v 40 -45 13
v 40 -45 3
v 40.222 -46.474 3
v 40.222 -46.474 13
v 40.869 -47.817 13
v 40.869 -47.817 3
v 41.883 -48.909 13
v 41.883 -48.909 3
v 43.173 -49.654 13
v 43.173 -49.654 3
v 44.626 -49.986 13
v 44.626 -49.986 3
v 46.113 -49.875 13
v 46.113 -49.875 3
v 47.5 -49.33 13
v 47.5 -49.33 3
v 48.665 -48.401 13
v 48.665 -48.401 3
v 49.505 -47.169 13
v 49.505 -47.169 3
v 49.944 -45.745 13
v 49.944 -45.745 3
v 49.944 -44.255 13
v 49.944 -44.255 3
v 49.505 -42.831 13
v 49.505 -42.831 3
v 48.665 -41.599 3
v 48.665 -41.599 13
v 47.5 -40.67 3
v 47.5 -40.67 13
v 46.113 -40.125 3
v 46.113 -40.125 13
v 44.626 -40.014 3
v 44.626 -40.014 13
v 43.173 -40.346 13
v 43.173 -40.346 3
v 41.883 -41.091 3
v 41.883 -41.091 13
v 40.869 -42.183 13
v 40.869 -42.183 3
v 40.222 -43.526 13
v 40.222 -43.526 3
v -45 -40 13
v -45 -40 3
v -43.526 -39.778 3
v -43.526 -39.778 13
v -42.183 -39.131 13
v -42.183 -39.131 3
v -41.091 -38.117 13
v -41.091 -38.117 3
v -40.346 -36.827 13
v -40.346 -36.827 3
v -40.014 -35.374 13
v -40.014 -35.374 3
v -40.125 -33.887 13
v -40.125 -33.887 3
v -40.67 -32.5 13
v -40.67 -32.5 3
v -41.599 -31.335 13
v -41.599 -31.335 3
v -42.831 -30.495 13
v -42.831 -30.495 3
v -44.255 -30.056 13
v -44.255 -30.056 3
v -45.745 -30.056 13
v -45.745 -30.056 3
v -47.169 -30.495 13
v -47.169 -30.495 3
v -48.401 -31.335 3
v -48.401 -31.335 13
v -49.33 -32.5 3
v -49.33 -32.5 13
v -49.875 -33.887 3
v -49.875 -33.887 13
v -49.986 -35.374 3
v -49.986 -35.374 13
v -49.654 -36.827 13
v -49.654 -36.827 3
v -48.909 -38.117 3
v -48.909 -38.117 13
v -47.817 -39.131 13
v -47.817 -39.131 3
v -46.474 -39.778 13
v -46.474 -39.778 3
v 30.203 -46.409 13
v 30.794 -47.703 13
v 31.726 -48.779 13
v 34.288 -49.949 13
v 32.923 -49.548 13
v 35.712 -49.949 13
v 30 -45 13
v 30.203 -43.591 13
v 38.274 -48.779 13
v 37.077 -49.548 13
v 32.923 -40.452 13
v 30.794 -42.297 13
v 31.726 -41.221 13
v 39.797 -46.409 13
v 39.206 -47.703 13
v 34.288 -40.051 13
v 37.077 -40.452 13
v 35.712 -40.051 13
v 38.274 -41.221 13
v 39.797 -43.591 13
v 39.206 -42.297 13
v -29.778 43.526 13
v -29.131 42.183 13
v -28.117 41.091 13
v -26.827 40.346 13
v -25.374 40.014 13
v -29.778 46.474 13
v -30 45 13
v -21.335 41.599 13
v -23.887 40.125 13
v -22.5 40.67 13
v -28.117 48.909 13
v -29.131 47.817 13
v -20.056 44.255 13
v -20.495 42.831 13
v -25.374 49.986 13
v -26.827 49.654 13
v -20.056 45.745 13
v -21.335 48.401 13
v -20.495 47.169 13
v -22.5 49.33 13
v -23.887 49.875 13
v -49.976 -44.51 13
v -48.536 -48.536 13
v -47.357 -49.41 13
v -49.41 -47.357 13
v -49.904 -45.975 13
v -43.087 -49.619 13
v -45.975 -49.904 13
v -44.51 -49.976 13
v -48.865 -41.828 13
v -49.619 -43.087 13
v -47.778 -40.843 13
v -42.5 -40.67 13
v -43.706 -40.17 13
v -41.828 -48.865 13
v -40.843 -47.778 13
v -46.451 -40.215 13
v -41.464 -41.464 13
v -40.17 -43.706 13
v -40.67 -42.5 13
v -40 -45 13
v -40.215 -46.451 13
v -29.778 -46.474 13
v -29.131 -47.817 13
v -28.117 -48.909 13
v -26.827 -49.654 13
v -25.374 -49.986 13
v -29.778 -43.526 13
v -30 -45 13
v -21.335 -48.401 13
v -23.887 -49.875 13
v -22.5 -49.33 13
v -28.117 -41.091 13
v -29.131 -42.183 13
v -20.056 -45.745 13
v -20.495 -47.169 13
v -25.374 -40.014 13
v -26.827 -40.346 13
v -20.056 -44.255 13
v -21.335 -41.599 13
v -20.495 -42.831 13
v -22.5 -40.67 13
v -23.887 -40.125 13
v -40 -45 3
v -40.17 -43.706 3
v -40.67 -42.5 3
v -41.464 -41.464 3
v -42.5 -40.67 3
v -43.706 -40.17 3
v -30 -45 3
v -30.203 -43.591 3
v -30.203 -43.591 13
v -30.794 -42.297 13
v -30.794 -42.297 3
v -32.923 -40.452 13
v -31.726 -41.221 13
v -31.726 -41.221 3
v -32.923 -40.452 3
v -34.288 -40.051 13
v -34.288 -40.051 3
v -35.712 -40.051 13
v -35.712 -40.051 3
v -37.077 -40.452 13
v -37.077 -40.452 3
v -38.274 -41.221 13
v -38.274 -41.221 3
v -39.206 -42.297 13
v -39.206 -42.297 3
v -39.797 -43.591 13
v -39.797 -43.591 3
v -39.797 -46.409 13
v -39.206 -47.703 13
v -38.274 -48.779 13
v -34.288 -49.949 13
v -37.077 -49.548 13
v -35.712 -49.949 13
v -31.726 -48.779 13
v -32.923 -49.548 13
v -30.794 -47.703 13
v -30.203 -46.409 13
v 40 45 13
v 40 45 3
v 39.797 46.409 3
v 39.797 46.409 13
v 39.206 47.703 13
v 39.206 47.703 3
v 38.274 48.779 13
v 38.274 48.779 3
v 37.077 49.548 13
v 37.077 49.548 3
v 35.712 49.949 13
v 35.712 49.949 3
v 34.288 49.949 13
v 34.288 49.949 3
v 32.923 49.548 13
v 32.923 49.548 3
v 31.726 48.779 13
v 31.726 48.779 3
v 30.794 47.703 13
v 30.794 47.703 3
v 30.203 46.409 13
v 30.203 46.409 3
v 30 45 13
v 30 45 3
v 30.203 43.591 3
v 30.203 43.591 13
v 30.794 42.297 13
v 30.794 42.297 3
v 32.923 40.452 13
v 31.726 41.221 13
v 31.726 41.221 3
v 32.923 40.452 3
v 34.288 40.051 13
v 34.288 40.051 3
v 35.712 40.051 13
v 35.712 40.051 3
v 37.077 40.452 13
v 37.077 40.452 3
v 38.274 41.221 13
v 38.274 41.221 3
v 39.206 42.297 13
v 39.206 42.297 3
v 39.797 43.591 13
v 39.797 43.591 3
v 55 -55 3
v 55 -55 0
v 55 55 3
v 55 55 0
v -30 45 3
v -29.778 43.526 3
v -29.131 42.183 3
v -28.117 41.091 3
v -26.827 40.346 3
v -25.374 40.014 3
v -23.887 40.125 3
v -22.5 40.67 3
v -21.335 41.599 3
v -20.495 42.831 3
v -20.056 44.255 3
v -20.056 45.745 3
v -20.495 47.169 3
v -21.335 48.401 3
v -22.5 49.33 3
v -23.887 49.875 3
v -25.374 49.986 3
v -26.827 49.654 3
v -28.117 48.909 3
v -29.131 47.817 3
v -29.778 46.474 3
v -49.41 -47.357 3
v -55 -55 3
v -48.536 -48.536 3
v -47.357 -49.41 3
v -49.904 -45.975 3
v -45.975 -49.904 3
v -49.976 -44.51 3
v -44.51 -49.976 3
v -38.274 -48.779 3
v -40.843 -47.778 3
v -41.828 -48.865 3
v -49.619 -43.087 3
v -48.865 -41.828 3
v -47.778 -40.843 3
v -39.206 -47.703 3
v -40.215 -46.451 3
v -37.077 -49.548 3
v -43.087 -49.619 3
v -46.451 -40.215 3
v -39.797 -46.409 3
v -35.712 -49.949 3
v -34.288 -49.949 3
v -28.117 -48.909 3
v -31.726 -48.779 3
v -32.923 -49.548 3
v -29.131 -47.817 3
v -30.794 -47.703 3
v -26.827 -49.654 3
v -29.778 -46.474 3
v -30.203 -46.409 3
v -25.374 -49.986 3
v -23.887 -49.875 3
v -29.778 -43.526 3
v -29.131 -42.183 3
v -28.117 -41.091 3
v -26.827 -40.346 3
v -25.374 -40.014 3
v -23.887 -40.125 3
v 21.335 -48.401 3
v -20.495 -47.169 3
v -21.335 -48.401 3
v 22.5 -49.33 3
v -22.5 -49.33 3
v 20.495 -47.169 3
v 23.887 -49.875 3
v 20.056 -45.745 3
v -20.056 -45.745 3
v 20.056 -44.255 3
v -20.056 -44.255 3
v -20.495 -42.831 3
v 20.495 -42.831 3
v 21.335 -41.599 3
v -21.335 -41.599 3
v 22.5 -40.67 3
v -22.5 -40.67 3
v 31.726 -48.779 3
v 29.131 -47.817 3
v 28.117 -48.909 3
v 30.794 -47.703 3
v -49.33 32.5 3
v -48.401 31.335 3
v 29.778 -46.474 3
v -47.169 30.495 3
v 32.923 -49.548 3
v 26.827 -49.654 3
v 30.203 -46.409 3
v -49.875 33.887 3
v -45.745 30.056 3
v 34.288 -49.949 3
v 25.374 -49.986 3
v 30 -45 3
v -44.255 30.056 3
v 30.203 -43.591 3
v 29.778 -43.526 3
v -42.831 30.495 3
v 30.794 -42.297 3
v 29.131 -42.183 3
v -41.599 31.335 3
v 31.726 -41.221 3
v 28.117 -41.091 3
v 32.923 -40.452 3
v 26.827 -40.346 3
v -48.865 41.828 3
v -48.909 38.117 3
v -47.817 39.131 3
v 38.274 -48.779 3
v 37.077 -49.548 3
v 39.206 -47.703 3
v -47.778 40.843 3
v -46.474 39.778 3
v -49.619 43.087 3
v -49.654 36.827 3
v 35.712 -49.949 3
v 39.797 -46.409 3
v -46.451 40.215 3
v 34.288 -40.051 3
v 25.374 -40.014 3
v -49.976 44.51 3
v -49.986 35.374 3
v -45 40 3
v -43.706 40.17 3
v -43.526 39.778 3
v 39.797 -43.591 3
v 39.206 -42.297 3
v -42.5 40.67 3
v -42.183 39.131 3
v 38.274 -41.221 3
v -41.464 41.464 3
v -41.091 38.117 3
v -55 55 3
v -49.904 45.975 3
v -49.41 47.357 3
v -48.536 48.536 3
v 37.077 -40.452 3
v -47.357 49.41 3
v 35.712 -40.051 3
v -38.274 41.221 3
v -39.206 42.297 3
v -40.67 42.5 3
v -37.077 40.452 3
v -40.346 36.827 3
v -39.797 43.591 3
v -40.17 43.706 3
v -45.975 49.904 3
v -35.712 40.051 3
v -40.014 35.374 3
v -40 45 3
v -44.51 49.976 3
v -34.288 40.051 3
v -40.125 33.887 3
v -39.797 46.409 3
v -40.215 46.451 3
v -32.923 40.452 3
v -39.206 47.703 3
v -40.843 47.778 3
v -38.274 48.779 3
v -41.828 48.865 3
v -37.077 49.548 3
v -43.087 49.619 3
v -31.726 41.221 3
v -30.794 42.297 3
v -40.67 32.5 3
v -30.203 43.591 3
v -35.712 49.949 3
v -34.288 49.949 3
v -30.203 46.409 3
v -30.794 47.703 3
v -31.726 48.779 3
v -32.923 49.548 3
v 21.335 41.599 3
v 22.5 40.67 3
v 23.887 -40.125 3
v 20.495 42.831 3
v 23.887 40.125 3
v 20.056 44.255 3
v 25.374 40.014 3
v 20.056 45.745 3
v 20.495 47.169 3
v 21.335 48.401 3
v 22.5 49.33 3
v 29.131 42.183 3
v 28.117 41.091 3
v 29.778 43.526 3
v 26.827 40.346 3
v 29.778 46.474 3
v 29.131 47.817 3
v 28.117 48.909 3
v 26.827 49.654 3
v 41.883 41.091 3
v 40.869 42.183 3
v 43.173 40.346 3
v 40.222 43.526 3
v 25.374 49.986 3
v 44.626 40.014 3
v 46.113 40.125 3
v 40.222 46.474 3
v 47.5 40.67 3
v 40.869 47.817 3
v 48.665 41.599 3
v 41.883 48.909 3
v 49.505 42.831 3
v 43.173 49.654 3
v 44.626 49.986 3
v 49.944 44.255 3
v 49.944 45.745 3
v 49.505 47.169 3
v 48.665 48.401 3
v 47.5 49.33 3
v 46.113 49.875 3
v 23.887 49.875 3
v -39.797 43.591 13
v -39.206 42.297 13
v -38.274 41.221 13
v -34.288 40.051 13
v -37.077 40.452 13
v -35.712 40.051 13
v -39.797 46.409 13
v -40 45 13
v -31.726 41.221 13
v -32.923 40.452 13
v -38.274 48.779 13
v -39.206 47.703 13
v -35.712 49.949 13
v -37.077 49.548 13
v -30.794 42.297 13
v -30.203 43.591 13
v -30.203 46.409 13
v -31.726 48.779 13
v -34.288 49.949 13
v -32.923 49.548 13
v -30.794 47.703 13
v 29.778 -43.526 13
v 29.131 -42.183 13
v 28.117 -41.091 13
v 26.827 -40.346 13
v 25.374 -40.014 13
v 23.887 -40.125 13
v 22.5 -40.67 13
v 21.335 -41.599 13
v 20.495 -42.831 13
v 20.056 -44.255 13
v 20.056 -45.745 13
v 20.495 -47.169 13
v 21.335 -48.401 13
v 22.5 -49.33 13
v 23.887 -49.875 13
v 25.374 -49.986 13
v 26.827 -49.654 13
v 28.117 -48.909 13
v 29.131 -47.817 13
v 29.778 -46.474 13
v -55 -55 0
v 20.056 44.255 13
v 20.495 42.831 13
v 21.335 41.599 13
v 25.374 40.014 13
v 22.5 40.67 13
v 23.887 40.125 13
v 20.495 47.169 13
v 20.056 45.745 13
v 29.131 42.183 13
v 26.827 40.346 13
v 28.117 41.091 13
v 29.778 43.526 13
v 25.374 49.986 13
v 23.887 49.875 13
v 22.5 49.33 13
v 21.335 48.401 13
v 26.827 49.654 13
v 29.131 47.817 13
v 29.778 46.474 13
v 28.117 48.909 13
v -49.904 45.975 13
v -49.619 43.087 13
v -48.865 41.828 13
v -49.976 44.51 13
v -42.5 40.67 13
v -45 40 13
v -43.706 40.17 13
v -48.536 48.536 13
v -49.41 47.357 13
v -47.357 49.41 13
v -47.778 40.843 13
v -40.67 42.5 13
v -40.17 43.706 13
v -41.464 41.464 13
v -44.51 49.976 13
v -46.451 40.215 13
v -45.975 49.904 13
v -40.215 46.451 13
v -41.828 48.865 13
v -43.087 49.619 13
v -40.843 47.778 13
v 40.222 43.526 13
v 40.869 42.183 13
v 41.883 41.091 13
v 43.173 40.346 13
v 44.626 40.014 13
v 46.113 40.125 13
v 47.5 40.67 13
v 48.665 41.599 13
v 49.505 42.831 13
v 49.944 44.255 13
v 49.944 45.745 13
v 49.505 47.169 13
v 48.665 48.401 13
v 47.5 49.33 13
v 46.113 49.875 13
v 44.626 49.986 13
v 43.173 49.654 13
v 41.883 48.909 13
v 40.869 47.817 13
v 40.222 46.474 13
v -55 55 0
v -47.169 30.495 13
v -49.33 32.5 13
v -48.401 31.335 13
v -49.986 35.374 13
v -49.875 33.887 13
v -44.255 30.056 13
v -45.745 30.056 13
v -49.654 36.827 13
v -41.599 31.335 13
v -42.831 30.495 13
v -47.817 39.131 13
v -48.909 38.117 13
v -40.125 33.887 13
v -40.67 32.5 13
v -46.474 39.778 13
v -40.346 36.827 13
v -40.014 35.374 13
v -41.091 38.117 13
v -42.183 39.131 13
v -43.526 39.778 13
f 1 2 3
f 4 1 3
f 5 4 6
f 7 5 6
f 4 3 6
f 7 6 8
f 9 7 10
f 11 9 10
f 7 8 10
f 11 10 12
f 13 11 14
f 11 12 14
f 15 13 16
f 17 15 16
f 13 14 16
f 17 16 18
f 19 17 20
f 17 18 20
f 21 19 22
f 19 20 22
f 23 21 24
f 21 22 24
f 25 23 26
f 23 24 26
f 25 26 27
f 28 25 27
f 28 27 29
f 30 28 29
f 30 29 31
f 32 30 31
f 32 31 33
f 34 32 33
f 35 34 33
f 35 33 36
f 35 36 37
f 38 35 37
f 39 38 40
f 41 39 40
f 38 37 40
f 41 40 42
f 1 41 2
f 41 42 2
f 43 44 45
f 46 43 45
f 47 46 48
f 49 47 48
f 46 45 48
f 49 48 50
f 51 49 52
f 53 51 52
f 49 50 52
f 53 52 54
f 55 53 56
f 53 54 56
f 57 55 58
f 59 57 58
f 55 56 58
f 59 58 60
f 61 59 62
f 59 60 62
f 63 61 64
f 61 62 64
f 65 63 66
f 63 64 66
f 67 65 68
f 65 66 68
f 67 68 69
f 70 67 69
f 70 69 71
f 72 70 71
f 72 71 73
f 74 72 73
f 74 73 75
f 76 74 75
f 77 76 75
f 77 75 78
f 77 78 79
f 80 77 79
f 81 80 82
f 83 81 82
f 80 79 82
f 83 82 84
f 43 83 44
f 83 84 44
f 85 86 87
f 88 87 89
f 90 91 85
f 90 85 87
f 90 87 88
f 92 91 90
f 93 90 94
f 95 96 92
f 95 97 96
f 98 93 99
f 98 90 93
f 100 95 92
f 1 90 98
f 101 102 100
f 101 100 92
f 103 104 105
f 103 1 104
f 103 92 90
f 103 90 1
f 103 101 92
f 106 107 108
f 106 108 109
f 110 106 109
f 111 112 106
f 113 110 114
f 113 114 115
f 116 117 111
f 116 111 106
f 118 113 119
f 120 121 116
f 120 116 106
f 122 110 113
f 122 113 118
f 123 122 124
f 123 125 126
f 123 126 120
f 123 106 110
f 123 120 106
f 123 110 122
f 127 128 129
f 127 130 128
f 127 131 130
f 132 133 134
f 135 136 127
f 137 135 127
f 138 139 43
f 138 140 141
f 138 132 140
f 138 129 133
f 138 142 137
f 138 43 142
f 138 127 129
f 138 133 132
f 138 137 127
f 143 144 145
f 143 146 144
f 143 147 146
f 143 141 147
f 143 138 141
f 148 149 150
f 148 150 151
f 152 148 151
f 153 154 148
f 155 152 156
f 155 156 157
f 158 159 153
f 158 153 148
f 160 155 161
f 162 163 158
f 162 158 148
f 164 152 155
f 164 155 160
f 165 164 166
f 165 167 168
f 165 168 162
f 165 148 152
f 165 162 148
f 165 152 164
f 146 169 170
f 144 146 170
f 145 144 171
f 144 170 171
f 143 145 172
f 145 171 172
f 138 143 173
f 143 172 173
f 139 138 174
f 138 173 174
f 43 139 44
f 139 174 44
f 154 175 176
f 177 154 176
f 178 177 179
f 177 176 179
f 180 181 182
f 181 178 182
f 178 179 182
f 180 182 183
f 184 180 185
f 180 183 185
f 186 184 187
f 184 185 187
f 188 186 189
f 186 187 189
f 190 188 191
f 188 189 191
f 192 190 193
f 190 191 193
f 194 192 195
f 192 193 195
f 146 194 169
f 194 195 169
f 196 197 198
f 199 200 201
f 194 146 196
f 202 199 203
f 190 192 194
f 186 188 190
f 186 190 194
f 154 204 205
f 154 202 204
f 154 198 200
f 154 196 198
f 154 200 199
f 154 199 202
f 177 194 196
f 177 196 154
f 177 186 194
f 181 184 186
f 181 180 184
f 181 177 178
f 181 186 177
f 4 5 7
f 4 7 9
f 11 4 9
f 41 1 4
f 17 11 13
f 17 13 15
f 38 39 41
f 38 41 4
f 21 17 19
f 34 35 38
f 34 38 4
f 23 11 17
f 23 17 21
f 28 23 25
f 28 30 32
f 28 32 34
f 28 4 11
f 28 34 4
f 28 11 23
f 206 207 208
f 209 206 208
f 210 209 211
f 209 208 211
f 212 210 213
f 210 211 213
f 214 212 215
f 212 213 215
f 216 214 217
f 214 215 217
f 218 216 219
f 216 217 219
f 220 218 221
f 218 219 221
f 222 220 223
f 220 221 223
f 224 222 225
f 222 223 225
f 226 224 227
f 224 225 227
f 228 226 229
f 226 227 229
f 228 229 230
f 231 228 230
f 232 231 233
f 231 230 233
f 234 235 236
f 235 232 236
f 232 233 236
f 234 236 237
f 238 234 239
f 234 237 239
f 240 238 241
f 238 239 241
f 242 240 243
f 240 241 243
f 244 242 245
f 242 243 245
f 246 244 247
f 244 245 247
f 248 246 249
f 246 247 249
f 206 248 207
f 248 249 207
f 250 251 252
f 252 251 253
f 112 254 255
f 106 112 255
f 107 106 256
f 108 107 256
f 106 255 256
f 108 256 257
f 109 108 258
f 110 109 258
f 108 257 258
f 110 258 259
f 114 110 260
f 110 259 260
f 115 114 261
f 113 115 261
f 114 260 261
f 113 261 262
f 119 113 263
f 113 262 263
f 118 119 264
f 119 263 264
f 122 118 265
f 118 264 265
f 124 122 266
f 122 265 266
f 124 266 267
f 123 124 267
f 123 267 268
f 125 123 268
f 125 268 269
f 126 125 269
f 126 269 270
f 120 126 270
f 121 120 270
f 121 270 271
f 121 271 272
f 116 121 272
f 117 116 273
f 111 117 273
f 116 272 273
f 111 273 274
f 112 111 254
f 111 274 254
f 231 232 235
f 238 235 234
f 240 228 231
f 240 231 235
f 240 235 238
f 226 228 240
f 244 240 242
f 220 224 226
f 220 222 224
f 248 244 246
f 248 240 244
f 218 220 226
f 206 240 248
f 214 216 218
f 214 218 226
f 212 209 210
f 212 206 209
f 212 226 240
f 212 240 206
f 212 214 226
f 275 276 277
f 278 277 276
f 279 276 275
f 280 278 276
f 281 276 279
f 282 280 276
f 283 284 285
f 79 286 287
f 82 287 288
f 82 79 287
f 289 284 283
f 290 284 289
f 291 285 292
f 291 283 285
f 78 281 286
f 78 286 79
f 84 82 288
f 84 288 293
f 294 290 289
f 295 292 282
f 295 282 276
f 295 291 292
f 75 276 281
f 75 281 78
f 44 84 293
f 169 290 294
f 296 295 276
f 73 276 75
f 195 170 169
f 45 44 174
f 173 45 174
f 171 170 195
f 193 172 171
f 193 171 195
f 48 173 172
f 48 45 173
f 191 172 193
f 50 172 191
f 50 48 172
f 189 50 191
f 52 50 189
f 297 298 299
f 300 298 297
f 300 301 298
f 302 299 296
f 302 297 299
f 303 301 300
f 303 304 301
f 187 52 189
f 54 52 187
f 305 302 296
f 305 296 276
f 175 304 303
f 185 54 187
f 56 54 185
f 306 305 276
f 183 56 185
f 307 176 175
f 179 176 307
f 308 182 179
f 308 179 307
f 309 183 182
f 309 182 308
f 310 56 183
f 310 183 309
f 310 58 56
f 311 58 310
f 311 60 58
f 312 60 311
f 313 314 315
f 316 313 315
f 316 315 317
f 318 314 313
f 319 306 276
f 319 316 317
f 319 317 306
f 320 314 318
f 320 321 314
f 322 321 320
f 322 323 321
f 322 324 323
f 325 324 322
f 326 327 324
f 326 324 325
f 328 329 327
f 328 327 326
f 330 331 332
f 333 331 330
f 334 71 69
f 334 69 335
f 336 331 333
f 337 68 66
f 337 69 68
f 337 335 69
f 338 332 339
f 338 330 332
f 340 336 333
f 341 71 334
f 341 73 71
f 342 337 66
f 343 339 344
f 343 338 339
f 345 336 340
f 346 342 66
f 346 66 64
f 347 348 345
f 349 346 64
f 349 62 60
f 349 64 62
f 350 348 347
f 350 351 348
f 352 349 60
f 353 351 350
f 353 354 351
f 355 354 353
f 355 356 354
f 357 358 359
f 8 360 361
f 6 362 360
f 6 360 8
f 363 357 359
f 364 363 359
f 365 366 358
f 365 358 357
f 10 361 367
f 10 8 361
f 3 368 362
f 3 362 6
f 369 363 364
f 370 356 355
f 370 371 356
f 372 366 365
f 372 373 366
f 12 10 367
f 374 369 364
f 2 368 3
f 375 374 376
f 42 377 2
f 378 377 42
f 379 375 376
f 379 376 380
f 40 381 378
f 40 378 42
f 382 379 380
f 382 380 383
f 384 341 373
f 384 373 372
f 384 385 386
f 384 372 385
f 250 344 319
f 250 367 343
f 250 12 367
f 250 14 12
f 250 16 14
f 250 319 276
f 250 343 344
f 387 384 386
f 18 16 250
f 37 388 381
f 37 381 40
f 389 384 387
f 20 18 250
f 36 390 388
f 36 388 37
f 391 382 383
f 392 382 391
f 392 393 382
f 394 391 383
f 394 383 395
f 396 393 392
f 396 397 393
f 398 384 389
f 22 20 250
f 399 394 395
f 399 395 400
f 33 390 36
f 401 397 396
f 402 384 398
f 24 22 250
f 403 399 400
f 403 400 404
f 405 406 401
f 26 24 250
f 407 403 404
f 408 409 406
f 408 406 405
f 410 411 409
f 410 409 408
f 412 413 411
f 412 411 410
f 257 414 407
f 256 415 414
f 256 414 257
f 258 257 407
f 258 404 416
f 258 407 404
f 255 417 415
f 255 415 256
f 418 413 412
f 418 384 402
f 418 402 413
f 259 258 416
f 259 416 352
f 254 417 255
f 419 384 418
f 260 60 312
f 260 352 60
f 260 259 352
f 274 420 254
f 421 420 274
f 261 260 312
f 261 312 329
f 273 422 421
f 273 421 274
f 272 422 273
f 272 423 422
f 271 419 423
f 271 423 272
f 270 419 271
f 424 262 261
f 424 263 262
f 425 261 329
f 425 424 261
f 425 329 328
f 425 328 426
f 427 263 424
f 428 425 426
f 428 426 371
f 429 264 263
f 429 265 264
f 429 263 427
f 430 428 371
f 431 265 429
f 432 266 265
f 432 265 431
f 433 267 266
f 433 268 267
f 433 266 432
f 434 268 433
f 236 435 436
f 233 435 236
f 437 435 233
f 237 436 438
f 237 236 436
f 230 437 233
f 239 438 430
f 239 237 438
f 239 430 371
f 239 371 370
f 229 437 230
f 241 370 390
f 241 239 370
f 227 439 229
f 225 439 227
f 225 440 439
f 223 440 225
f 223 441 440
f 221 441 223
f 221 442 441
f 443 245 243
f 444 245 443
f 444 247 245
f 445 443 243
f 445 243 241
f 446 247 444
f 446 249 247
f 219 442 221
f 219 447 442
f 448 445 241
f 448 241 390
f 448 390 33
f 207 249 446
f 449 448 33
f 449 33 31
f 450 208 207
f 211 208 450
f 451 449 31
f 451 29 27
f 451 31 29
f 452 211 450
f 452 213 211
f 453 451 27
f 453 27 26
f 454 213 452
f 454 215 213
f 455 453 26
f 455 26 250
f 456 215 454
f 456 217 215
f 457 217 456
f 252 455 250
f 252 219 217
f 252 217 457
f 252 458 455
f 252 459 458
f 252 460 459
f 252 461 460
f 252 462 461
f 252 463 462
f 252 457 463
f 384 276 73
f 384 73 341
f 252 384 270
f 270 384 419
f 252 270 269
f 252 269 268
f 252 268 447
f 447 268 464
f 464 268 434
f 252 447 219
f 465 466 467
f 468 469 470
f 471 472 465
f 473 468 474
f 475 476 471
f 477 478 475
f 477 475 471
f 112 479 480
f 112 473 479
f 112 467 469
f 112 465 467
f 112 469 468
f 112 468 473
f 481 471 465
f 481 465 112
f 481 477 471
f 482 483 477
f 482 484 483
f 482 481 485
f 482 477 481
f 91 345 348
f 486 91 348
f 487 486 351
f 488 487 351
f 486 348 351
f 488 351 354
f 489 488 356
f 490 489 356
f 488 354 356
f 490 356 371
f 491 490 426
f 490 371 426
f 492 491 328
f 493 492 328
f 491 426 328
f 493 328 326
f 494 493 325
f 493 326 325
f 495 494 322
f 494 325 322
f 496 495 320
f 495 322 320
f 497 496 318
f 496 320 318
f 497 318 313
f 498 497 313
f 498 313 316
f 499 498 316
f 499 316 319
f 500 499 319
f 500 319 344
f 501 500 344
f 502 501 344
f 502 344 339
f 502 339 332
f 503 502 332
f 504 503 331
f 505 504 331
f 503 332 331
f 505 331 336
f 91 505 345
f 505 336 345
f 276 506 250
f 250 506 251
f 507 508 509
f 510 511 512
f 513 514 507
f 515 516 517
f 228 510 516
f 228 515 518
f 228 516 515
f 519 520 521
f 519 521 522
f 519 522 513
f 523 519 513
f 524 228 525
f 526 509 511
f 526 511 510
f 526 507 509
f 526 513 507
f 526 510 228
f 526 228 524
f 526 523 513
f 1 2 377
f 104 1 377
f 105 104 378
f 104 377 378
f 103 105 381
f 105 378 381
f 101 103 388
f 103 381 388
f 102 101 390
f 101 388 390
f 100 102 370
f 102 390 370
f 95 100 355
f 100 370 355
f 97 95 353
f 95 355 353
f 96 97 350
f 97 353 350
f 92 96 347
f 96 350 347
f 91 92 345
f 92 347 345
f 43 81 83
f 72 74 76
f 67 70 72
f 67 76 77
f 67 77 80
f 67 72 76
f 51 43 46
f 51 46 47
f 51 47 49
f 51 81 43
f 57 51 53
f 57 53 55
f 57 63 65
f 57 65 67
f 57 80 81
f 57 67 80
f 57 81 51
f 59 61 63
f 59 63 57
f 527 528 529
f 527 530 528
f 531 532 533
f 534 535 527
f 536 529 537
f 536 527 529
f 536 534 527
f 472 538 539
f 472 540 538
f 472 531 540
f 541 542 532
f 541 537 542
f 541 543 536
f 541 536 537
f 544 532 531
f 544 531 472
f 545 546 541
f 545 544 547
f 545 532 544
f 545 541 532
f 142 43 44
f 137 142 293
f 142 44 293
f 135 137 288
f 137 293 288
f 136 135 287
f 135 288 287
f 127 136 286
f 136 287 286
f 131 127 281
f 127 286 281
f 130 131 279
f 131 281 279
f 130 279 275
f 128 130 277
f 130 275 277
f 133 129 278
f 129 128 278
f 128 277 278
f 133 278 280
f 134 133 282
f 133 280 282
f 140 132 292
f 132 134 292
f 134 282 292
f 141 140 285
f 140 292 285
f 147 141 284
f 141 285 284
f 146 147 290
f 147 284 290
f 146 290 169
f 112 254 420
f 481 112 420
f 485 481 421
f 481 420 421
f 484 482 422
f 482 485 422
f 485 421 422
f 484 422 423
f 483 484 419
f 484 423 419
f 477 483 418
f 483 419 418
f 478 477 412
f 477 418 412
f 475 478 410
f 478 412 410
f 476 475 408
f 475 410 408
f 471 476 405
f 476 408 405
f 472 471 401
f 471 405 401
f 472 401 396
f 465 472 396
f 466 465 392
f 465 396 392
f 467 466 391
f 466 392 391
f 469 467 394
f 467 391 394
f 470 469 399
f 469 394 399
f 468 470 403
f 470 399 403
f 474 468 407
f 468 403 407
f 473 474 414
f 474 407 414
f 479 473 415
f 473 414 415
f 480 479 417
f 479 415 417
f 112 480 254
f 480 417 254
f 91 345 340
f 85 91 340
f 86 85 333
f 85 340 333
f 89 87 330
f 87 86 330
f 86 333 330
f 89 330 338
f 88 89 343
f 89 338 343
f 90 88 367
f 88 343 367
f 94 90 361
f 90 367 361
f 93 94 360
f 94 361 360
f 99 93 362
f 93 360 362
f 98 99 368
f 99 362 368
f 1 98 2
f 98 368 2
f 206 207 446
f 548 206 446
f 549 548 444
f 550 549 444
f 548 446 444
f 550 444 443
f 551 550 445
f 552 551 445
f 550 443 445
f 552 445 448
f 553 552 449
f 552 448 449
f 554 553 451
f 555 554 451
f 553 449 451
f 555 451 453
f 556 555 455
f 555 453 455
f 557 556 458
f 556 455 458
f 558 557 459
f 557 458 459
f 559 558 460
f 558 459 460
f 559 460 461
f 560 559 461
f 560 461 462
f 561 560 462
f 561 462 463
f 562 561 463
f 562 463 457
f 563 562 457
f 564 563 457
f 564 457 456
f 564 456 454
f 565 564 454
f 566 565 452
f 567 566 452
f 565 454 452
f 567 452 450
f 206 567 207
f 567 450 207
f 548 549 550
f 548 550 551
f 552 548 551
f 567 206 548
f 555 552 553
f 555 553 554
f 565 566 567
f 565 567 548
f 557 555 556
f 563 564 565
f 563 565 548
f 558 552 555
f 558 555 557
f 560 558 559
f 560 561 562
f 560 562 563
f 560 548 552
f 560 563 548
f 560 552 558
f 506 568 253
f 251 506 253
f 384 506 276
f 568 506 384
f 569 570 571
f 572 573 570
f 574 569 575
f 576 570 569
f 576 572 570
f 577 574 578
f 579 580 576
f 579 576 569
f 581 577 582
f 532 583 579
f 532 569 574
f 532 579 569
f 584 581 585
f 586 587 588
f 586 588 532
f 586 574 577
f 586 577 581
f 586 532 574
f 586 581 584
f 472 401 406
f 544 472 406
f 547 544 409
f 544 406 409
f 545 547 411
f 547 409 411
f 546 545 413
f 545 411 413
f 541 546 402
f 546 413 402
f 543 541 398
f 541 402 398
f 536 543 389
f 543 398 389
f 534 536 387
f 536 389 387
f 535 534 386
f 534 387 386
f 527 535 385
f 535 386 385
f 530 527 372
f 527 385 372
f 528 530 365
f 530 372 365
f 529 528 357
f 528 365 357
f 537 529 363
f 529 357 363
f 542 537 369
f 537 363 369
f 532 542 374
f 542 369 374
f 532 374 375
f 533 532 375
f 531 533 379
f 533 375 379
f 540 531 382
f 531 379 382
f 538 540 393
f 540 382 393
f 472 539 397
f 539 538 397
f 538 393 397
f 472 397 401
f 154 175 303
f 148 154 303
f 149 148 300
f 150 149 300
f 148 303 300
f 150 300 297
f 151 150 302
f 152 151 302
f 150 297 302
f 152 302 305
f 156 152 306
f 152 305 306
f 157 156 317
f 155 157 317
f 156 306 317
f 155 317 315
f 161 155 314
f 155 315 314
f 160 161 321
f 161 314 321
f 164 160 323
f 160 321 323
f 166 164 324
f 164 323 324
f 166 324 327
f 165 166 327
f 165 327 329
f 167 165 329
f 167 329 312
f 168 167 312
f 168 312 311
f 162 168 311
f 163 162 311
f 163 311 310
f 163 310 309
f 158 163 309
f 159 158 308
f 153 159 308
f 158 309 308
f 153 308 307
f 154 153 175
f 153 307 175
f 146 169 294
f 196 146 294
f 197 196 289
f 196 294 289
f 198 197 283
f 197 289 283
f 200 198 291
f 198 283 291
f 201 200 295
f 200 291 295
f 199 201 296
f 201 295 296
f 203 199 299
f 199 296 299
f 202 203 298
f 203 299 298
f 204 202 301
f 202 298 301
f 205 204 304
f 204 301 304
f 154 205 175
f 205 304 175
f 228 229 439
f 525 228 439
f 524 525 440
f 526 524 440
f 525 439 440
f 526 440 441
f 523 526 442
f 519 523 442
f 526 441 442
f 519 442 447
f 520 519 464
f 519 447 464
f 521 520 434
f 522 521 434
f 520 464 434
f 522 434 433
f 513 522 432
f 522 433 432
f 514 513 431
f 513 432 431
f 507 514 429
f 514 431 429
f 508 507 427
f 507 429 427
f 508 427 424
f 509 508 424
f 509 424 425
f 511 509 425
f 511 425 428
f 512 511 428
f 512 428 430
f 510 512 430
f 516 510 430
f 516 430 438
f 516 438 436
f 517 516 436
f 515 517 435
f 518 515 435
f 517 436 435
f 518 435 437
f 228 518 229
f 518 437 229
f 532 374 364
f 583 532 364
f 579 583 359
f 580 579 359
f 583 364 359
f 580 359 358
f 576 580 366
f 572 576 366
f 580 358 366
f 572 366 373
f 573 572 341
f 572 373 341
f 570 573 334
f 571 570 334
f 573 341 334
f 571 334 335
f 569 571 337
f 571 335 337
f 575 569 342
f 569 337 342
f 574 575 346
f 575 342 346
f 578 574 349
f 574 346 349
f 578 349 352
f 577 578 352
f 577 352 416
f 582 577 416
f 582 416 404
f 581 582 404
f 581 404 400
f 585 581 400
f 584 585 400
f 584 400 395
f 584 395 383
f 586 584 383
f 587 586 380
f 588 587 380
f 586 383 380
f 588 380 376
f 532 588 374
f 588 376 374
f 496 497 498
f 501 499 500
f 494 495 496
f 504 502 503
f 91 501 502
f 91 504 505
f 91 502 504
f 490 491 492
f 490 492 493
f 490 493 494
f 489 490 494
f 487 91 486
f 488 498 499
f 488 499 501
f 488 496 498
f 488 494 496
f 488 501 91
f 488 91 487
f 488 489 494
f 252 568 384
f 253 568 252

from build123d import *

# Parameters (mm, degrees)
SKETCH_W     = 110
SKETCH_H     = 110
PAD_DEPTH    = 3
SKETCH001_R  = 5
PAD001_DEPTH = 10


with BuildPart() as part:
    # Sketch → Pad (new body)
    with BuildSketch(Plane.XY):
        Rectangle(SKETCH_W, SKETCH_H)
    extrude(amount=PAD_DEPTH)

    # Sketch001 (on Face6 of Pad) → Pad001 (join)
    with BuildSketch(Plane.XY.offset(3)):
        with Locations((-45, 45)):
            Circle(SKETCH001_R)
        with Locations((45, 45)):
            Circle(SKETCH001_R)
        with Locations((45, -45)):
            Circle(SKETCH001_R)
        with Locations((-45, -45)):
            Circle(SKETCH001_R)
        with Locations((-35, 45)):
            Circle(SKETCH001_R)
        with Locations((-25, 45)):
            Circle(SKETCH001_R)
        with Locations((-45, 35)):
            Circle(SKETCH001_R)
        with Locations((35, 45)):
            Circle(SKETCH001_R)
        with Locations((25, 45)):
            Circle(SKETCH001_R)
        with Locations((-45, -35)):
            Circle(SKETCH001_R)
        with Locations((-35, -45)):
            Circle(SKETCH001_R)
        with Locations((-25, -45)):
            Circle(SKETCH001_R)
        with Locations((35, -45)):
            Circle(SKETCH001_R)
        with Locations((25, -45)):
            Circle(SKETCH001_R)
    extrude(amount=PAD001_DEPTH)


solid = part.part
